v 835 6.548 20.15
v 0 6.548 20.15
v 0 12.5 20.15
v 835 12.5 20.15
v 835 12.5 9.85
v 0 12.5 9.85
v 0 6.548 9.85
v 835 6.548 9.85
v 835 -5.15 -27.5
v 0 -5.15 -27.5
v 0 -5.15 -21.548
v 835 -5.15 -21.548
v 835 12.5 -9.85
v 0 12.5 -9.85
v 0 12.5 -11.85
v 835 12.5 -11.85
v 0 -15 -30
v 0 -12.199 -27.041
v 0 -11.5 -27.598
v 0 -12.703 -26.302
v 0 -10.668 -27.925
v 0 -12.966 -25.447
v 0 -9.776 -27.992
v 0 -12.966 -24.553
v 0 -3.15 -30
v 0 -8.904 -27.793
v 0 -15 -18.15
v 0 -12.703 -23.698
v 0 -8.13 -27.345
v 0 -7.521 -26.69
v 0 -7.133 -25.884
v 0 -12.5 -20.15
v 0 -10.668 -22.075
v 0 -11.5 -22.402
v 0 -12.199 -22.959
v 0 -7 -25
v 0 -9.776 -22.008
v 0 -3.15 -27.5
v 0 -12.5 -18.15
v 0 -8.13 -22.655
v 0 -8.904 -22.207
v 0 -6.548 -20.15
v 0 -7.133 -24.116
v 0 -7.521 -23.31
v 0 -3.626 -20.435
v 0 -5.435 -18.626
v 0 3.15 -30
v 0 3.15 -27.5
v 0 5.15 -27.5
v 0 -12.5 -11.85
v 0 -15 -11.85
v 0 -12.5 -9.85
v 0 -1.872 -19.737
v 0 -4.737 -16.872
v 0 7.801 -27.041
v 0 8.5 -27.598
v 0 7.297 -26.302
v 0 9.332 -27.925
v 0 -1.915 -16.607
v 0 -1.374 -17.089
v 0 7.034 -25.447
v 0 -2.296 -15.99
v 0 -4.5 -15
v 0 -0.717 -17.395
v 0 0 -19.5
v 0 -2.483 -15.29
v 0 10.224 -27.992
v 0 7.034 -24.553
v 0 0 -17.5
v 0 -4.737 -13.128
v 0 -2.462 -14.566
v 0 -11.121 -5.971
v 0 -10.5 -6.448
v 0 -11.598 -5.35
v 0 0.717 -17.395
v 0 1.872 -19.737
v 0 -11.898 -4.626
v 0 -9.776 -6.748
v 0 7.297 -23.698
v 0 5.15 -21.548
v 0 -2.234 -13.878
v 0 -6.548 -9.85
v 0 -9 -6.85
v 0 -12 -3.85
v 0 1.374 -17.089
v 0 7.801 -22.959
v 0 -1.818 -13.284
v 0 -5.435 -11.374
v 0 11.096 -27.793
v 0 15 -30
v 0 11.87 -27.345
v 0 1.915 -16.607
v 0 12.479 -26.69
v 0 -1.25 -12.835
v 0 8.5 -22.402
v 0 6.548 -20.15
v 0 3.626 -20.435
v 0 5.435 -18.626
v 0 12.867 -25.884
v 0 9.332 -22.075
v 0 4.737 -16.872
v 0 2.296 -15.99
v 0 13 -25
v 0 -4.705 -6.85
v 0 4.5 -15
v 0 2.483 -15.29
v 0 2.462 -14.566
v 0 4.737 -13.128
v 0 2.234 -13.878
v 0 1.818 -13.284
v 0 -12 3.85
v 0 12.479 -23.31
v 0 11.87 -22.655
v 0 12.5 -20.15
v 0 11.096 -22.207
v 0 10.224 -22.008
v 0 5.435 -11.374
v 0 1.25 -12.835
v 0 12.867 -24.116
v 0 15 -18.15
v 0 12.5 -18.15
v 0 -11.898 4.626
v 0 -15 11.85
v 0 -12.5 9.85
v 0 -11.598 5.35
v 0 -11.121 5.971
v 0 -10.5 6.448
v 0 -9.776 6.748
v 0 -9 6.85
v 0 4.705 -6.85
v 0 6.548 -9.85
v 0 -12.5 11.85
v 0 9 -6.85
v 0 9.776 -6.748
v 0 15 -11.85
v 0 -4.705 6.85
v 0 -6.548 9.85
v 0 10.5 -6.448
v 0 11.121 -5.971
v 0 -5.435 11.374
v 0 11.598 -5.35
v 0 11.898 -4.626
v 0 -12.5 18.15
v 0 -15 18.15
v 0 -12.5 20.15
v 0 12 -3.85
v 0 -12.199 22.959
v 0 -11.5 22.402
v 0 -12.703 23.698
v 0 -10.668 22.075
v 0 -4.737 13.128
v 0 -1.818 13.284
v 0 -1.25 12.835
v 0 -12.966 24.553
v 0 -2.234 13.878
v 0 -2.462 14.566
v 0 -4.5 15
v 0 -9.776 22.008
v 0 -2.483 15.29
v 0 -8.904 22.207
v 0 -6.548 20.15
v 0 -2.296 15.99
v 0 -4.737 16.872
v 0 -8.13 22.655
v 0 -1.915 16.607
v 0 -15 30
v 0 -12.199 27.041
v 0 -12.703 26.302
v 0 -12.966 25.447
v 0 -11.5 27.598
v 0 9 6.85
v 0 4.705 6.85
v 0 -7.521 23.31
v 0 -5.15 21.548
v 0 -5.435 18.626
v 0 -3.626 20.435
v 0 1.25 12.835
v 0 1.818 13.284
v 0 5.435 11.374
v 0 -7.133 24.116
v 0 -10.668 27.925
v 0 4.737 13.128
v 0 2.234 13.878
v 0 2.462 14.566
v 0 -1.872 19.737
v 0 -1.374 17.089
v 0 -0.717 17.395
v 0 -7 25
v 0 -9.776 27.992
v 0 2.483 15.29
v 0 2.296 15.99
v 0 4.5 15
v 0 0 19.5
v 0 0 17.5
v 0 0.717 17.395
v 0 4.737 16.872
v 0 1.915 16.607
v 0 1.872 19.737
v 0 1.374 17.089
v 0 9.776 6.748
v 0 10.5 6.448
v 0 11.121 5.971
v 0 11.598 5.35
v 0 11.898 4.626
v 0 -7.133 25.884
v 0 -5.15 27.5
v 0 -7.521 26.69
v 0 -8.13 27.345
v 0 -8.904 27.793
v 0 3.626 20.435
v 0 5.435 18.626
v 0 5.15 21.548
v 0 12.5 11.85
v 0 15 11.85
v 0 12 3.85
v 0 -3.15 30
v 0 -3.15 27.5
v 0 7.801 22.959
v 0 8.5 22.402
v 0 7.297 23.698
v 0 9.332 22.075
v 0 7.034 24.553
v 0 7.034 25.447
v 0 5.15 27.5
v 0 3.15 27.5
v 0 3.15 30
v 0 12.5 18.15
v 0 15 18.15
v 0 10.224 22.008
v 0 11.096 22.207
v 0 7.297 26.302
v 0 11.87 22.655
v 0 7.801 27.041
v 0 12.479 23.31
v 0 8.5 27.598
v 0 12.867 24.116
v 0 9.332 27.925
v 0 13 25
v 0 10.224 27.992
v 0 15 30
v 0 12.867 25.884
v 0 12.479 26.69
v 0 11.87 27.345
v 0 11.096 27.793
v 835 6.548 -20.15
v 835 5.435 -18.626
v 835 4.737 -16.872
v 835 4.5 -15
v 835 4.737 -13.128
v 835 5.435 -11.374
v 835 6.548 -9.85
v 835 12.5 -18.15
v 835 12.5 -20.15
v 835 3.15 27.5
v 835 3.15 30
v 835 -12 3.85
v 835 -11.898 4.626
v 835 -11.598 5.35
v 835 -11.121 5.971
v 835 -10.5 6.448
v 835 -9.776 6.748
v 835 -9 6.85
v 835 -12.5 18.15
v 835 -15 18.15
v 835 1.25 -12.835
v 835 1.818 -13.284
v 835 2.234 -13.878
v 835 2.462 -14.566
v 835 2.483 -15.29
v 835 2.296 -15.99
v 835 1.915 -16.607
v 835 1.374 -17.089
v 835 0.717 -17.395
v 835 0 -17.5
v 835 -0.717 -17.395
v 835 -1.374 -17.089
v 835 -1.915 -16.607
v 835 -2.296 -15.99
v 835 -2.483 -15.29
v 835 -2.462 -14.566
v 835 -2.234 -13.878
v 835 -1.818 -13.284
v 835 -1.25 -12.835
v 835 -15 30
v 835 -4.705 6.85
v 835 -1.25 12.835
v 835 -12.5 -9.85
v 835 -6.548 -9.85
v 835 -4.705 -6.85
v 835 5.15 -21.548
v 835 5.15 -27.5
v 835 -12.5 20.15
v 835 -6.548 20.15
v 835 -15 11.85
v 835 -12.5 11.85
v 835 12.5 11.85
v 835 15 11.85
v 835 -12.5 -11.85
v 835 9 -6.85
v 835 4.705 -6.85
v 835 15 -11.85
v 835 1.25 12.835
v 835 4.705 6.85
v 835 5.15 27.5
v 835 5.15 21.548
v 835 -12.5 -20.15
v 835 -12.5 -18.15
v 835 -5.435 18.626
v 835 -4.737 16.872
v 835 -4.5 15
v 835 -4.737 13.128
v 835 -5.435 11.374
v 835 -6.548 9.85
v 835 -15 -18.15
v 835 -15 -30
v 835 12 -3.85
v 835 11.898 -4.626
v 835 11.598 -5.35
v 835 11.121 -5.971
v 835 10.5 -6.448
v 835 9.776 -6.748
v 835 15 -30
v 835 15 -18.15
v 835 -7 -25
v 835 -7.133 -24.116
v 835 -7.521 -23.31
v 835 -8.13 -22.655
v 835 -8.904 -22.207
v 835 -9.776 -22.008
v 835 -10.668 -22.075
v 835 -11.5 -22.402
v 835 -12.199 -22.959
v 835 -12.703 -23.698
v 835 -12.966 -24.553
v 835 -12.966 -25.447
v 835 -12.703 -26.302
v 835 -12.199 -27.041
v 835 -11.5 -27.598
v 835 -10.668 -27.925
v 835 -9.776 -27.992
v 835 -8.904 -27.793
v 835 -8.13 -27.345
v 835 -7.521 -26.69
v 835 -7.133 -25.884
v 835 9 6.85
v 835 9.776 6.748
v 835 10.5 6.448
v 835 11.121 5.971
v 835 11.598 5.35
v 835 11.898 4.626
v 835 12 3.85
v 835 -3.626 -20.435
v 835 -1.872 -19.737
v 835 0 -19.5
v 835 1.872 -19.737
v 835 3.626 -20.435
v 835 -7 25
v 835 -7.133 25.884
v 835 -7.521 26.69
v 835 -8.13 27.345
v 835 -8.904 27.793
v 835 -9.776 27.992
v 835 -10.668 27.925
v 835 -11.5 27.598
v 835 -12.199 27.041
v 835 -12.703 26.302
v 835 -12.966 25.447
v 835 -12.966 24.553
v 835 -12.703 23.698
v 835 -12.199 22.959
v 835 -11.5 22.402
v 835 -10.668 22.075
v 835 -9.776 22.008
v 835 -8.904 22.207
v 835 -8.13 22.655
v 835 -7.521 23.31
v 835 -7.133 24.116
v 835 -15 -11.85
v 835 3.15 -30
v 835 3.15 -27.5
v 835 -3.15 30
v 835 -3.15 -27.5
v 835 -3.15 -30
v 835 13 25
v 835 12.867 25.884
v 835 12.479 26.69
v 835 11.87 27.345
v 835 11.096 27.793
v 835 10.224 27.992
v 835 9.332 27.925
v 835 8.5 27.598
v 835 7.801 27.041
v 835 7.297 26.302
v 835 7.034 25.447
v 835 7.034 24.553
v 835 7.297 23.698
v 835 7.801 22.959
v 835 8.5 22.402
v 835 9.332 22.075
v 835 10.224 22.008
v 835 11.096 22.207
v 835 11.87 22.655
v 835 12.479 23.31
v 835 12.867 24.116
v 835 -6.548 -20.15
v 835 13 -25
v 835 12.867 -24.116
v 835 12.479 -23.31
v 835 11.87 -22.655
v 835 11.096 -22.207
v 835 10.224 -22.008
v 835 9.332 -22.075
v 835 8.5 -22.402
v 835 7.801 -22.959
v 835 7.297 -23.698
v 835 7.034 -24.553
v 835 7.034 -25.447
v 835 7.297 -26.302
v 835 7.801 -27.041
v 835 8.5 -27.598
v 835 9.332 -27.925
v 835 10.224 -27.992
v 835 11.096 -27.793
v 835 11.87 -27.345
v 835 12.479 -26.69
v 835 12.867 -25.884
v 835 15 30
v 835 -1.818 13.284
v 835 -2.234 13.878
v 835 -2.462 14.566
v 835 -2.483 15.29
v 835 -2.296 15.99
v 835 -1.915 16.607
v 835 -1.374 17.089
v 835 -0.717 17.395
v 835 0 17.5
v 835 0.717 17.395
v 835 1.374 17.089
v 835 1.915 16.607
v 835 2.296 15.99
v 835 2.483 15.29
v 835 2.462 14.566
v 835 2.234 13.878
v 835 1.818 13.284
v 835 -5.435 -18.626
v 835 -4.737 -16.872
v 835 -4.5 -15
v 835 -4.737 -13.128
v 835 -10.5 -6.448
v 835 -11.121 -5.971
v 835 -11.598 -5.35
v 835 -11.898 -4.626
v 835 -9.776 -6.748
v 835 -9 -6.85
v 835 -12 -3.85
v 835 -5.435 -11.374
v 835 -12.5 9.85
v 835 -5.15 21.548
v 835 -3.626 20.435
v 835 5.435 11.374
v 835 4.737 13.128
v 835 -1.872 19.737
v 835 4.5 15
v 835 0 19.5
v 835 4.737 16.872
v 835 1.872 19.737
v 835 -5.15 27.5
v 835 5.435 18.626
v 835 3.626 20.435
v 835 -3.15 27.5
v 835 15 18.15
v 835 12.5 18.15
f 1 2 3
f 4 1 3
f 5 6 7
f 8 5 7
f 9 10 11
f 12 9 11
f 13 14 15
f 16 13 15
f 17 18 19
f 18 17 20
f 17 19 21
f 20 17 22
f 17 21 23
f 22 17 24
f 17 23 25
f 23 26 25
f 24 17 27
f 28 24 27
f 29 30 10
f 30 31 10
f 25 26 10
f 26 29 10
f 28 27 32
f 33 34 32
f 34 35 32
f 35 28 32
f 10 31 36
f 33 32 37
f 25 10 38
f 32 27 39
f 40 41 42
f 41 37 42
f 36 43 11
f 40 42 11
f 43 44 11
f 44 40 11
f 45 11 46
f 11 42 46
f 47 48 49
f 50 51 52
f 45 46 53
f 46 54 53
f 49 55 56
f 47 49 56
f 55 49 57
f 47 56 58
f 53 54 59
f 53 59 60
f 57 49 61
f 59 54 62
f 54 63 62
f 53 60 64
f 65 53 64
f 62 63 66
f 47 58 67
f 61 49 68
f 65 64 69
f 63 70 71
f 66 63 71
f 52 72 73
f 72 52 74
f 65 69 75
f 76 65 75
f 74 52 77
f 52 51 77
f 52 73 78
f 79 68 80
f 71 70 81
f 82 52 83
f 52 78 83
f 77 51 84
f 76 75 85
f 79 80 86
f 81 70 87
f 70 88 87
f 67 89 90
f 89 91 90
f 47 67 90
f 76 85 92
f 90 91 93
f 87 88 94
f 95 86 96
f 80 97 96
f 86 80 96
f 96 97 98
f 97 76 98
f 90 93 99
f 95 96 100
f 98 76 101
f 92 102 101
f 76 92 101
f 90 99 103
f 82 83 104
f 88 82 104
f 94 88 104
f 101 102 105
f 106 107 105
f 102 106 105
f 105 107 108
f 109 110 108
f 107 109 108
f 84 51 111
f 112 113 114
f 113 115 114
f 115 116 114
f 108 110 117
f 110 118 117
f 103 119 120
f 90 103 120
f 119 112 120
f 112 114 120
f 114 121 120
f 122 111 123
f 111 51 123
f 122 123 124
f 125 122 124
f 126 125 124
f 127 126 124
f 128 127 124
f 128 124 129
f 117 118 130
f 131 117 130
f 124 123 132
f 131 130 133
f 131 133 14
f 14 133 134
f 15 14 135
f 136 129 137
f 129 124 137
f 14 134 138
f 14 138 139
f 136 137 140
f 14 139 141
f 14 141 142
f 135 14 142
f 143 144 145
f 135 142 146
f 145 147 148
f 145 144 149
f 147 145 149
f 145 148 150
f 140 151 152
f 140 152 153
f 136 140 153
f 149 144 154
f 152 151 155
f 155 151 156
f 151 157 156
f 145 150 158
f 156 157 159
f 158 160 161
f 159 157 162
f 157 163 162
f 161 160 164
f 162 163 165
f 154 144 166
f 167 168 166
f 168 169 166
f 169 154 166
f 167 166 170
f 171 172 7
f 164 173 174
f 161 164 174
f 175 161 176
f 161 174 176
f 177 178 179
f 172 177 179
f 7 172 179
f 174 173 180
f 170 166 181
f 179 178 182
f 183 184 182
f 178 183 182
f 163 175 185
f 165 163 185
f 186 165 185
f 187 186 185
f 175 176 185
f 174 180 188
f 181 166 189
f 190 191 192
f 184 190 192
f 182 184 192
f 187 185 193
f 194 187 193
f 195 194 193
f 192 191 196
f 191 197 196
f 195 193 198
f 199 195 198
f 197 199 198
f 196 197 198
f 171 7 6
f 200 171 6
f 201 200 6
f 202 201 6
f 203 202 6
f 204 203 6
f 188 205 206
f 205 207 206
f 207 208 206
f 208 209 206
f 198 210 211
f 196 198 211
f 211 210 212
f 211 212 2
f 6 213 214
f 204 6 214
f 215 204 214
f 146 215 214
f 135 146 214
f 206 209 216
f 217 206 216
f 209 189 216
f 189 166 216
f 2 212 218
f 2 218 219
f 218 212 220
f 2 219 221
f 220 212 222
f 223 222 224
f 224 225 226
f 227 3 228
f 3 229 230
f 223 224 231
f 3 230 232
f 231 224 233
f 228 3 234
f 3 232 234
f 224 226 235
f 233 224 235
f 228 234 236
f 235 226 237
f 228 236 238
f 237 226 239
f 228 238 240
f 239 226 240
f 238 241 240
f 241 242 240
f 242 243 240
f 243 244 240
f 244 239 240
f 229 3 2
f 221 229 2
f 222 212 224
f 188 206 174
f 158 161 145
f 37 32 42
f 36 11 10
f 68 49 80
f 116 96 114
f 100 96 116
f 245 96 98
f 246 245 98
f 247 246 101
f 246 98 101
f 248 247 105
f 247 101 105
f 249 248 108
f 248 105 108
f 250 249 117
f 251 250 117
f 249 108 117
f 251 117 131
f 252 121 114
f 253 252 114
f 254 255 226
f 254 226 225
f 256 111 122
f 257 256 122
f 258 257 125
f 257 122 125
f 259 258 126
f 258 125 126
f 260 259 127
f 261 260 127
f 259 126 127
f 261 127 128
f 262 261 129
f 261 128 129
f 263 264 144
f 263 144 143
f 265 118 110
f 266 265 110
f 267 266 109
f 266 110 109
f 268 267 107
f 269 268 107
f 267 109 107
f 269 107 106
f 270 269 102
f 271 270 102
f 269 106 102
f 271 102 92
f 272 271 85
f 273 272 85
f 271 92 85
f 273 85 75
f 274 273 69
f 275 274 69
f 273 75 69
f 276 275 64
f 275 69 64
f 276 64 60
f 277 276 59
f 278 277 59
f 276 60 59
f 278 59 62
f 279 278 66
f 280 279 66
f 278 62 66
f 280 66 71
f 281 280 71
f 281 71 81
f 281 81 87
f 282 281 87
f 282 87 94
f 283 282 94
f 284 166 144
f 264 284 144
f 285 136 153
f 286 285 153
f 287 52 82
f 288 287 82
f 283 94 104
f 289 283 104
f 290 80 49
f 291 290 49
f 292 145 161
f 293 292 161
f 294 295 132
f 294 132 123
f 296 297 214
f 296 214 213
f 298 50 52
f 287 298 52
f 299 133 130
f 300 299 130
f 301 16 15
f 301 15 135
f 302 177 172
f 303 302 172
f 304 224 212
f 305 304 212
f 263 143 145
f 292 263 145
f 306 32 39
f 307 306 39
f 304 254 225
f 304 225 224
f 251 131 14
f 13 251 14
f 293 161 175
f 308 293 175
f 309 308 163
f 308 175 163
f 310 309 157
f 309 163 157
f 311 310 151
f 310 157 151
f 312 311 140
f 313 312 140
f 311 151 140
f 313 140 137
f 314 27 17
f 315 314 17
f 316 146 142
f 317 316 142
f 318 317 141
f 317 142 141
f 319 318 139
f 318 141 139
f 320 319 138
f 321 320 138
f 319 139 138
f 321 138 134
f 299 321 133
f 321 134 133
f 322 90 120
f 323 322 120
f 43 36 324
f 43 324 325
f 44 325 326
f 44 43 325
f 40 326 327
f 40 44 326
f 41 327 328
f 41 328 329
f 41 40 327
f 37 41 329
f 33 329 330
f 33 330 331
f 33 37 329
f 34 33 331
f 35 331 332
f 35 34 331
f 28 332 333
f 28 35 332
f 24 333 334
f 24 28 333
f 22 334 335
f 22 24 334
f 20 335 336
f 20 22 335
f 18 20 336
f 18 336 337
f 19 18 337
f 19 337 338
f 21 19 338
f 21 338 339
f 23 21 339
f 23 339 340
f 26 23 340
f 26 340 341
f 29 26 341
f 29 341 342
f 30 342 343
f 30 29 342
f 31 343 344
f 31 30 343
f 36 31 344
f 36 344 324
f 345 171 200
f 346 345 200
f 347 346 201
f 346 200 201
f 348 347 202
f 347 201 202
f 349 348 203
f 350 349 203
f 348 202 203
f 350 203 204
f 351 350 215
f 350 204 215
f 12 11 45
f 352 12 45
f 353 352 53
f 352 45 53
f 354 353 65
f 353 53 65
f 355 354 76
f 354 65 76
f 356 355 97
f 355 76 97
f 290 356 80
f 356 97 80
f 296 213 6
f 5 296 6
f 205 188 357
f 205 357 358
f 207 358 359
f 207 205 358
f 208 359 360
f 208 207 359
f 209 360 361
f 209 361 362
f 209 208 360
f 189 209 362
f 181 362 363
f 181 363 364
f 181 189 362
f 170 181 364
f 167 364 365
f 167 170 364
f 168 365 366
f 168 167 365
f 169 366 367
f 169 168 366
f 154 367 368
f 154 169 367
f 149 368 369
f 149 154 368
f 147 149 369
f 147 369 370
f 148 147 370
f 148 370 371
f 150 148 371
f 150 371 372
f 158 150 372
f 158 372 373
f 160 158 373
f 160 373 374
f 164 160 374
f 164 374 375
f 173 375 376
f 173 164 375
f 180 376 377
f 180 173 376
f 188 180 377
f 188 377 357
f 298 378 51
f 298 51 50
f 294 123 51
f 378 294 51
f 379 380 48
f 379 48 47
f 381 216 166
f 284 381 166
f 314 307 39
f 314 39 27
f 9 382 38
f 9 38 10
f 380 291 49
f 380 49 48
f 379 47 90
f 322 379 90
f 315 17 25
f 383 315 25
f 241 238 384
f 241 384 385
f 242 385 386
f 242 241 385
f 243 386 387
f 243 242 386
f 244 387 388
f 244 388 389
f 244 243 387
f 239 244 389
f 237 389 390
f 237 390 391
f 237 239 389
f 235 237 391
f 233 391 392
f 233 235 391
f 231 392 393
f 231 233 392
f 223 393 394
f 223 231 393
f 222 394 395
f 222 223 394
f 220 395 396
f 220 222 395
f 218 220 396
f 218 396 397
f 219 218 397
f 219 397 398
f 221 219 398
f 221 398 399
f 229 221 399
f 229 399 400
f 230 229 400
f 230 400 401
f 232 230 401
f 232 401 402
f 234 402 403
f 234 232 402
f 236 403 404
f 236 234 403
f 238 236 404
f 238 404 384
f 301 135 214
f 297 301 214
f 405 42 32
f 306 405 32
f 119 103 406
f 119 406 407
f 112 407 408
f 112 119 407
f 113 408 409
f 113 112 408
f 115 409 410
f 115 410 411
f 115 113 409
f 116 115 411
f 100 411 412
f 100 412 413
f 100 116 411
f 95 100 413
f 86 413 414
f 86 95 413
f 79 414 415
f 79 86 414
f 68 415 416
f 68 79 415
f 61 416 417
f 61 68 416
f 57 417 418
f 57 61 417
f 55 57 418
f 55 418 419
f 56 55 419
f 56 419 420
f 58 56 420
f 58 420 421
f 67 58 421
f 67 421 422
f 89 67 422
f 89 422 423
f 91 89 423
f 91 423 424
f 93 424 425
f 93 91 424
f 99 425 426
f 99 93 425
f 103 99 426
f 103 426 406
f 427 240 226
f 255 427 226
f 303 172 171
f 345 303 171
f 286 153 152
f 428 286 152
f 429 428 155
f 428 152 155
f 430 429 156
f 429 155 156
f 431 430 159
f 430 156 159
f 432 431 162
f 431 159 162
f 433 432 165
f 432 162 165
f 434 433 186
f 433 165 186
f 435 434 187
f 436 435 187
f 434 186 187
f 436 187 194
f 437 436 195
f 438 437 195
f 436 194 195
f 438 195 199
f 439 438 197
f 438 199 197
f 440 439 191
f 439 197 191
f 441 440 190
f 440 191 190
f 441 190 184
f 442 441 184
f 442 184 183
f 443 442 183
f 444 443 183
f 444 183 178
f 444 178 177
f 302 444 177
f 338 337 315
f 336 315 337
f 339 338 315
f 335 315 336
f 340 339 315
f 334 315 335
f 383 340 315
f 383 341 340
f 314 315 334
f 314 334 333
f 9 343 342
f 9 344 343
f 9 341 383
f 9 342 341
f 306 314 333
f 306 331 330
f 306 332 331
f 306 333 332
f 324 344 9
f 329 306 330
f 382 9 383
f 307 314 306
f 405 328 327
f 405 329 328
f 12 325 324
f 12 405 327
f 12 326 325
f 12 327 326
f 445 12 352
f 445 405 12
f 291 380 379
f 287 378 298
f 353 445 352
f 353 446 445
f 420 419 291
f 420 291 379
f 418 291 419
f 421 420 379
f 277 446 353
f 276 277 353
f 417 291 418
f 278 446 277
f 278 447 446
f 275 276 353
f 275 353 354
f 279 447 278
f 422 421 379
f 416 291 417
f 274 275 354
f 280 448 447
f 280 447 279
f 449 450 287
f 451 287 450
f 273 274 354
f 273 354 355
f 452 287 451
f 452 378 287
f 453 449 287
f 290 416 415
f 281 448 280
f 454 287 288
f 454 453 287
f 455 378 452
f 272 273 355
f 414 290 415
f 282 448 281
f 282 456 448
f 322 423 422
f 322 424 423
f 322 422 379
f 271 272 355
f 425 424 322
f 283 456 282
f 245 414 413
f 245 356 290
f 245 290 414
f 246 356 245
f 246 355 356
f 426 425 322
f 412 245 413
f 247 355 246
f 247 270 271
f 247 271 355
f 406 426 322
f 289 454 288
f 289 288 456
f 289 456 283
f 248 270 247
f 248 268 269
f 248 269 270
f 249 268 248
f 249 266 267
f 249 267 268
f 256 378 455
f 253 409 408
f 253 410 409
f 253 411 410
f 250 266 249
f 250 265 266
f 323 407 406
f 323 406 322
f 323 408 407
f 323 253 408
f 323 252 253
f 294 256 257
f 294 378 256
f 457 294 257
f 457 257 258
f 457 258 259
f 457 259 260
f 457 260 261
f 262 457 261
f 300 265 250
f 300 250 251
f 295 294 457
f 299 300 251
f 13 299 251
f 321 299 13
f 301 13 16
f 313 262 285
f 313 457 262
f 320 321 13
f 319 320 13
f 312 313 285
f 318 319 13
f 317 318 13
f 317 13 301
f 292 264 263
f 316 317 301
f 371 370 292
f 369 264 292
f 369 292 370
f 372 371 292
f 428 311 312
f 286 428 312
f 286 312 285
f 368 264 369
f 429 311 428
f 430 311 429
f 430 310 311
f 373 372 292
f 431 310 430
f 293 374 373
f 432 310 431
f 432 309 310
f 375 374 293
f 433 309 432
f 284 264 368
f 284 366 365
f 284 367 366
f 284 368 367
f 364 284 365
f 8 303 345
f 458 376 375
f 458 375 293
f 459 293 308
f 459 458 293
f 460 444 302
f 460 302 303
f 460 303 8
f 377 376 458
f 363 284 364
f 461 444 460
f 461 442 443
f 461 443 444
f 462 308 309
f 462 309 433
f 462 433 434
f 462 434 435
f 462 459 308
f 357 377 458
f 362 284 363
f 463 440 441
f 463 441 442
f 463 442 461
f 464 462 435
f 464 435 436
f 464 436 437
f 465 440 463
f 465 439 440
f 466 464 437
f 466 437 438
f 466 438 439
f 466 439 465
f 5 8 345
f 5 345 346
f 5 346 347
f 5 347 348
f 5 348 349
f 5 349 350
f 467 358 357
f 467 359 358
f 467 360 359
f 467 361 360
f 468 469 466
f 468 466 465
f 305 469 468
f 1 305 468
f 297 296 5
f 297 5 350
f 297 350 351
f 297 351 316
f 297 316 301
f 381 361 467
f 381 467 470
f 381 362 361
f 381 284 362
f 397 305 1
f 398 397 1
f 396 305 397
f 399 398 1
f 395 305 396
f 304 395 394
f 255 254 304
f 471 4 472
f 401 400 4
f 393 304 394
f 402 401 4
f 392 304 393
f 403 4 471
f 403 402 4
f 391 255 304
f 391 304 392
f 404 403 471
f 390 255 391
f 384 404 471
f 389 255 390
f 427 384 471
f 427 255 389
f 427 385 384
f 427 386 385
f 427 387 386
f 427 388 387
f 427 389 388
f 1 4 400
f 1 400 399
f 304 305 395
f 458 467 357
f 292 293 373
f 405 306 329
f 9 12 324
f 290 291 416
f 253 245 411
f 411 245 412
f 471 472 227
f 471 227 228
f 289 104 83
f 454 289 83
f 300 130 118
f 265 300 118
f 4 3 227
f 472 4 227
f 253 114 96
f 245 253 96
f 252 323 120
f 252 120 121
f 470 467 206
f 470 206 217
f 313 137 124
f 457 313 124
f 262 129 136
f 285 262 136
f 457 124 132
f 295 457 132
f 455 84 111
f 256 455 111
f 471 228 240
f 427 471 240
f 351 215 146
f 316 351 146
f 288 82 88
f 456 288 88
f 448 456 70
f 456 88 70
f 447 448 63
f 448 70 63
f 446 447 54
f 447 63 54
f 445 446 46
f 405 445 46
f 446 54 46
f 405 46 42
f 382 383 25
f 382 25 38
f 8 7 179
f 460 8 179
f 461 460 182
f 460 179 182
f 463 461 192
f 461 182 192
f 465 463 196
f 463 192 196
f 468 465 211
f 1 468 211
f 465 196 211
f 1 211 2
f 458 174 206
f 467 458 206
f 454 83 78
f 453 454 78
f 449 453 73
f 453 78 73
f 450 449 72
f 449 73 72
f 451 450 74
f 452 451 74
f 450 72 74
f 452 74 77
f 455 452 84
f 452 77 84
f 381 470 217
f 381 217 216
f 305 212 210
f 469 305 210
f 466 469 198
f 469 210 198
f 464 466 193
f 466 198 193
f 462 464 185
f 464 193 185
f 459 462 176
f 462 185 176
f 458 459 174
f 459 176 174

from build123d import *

# Parameters (mm, degrees)
F0_R     = 3
F1_DEPTH = 835


# Not quite as in the source:
# - ends of sketch curves that miss each other by under 0.0002 mm in the source are joined


with BuildPart() as f1:
    # F0 (on Right) → F1 (new body)
    with BuildSketch(Plane.YZ):
        with BuildLine():
            Line((12.5, -11.85), (15, -11.85))
            Line((15, -11.85), (15, 11.85))
            Line((15, 11.85), (12.5, 11.85))
            Line((12.5, 11.85), (12.5, 9.85))
            Line((12.5, 9.85), (6.547707, 9.85))
            ThreePointArc((6.5477069495, 9.8499999523), (4.5, 15), (6.5477069495, 20.1500000477))
            Line((6.547707, 20.15), (12.5, 20.15))
            Line((12.5, 20.15), (12.5, 18.15))
            Line((12.5, 18.15), (15, 18.15))
            Line((15, 18.15), (15, 30))
            Line((15, 30), (3.15, 30))
            Line((3.15, 30), (3.15, 27.5))
            Line((3.15, 27.5), (5.15, 27.5))
            Line((5.15, 27.5), (5.15, 21.547707))
            ThreePointArc((5.1500000477, 21.5477069495), (0, 19.5), (-5.1500000477, 21.5477069495))
            Line((-5.15, 21.547707), (-5.15, 27.5))
            Line((-5.15, 27.5), (-3.15, 27.5))
            Line((-3.15, 27.5), (-3.15, 30))
            Line((-3.15, 30), (-15, 30))
            Line((-15, 30), (-15, 18.15))
            Line((-15, 18.15), (-12.5, 18.15))
            Line((-12.5, 18.15), (-12.5, 20.15))
            Line((-12.5, 20.15), (-6.547707, 20.15))
            ThreePointArc((-6.5477069495, 20.1500000477), (-4.5, 15), (-6.5477069495, 9.8499999523))
            Line((-6.547707, 9.85), (-12.5, 9.85))
            Line((-12.5, 9.85), (-12.5, 11.85))
            Line((-12.5, 11.85), (-15, 11.85))
            Line((-15, 11.85), (-15, -11.85))
            Line((-15, -11.85), (-12.5, -11.85))
            Line((-12.5, -11.85), (-12.5, -9.85))
            Line((-12.5, -9.85), (-6.547707, -9.85))
            ThreePointArc((-6.5477069495, -9.8499999523), (-4.5, -15), (-6.5477069495, -20.1500000477))
            Line((-6.547707, -20.15), (-12.5, -20.15))
            Line((-12.5, -20.15), (-12.5, -18.15))
            Line((-12.5, -18.15), (-15, -18.15))
            Line((-15, -18.15), (-15, -30))
            Line((-15, -30), (-3.15, -30))
            Line((-3.15, -30), (-3.15, -27.5))
            Line((-3.15, -27.5), (-5.15, -27.5))
            Line((-5.15, -27.5), (-5.15, -21.547707))
            ThreePointArc((-5.1500000477, -21.5477069495), (0, -19.5), (5.1500000477, -21.5477069495))
            Line((5.15, -21.547707), (5.15, -27.5))
            Line((5.15, -27.5), (3.15, -27.5))
            Line((3.15, -27.5), (3.15, -30))
            Line((3.15, -30), (15, -30))
            Line((15, -30), (15, -18.15))
            Line((15, -18.15), (12.5, -18.15))
            Line((12.5, -18.15), (12.5, -20.15))
            Line((12.5, -20.15), (6.547707, -20.15))
            ThreePointArc((6.5477069495, -20.1500000477), (4.5, -15), (6.5477069495, -9.8499999523))
            Line((6.547707, -9.85), (12.5, -9.85))
            Line((12.5, -9.85), (12.5, -11.85))
        make_face()
        with Locations((-10, -25)):
            Circle(F0_R, mode=Mode.SUBTRACT)
        with Locations((10, -25)):
            Circle(F0_R, mode=Mode.SUBTRACT)
        with Locations((-10, 25)):
            Circle(F0_R, mode=Mode.SUBTRACT)
        with BuildLine():
            ThreePointArc((-12, 3.85), (-11.1213203436, 5.9713203436), (-9, 6.85))
            Line((-9, 6.85), (-4.705405, 6.85))
            Line((-4.705405, 6.85), (-1.25, 12.834936))
            ThreePointArc((-1.25, 12.834936), (0, 17.5), (1.2499997876, 12.8349363679))
            Line((1.2499997876, 12.8349363679), (4.705405, 6.85))
            Line((4.705405, 6.85), (9, 6.85))
            ThreePointArc((9, 6.85), (11.1213203436, 5.9713203436), (12, 3.85))
            Line((12, 3.85), (12, -3.85))
            ThreePointArc((12, -3.85), (11.1213203436, -5.9713203436), (9, -6.85))
            Line((9, -6.85), (4.705405, -6.85))
            Line((4.705405, -6.85), (1.25, -12.834937))
            ThreePointArc((1.25, -12.834937), (0, -17.5), (-1.2500002206, -12.8349366179))
            Line((-1.2500002206, -12.8349366179), (-4.705405, -6.85))
            Line((-4.705405, -6.85), (-9, -6.85))
            ThreePointArc((-9, -6.85), (-11.1213203436, -5.9713203436), (-12, -3.85))
            Line((-12, -3.85), (-12, 3.85))
        make_face(mode=Mode.SUBTRACT)
        with Locations((10, 25)):
            Circle(F0_R, mode=Mode.SUBTRACT)
    extrude(amount=F1_DEPTH)


solid = f1.part
